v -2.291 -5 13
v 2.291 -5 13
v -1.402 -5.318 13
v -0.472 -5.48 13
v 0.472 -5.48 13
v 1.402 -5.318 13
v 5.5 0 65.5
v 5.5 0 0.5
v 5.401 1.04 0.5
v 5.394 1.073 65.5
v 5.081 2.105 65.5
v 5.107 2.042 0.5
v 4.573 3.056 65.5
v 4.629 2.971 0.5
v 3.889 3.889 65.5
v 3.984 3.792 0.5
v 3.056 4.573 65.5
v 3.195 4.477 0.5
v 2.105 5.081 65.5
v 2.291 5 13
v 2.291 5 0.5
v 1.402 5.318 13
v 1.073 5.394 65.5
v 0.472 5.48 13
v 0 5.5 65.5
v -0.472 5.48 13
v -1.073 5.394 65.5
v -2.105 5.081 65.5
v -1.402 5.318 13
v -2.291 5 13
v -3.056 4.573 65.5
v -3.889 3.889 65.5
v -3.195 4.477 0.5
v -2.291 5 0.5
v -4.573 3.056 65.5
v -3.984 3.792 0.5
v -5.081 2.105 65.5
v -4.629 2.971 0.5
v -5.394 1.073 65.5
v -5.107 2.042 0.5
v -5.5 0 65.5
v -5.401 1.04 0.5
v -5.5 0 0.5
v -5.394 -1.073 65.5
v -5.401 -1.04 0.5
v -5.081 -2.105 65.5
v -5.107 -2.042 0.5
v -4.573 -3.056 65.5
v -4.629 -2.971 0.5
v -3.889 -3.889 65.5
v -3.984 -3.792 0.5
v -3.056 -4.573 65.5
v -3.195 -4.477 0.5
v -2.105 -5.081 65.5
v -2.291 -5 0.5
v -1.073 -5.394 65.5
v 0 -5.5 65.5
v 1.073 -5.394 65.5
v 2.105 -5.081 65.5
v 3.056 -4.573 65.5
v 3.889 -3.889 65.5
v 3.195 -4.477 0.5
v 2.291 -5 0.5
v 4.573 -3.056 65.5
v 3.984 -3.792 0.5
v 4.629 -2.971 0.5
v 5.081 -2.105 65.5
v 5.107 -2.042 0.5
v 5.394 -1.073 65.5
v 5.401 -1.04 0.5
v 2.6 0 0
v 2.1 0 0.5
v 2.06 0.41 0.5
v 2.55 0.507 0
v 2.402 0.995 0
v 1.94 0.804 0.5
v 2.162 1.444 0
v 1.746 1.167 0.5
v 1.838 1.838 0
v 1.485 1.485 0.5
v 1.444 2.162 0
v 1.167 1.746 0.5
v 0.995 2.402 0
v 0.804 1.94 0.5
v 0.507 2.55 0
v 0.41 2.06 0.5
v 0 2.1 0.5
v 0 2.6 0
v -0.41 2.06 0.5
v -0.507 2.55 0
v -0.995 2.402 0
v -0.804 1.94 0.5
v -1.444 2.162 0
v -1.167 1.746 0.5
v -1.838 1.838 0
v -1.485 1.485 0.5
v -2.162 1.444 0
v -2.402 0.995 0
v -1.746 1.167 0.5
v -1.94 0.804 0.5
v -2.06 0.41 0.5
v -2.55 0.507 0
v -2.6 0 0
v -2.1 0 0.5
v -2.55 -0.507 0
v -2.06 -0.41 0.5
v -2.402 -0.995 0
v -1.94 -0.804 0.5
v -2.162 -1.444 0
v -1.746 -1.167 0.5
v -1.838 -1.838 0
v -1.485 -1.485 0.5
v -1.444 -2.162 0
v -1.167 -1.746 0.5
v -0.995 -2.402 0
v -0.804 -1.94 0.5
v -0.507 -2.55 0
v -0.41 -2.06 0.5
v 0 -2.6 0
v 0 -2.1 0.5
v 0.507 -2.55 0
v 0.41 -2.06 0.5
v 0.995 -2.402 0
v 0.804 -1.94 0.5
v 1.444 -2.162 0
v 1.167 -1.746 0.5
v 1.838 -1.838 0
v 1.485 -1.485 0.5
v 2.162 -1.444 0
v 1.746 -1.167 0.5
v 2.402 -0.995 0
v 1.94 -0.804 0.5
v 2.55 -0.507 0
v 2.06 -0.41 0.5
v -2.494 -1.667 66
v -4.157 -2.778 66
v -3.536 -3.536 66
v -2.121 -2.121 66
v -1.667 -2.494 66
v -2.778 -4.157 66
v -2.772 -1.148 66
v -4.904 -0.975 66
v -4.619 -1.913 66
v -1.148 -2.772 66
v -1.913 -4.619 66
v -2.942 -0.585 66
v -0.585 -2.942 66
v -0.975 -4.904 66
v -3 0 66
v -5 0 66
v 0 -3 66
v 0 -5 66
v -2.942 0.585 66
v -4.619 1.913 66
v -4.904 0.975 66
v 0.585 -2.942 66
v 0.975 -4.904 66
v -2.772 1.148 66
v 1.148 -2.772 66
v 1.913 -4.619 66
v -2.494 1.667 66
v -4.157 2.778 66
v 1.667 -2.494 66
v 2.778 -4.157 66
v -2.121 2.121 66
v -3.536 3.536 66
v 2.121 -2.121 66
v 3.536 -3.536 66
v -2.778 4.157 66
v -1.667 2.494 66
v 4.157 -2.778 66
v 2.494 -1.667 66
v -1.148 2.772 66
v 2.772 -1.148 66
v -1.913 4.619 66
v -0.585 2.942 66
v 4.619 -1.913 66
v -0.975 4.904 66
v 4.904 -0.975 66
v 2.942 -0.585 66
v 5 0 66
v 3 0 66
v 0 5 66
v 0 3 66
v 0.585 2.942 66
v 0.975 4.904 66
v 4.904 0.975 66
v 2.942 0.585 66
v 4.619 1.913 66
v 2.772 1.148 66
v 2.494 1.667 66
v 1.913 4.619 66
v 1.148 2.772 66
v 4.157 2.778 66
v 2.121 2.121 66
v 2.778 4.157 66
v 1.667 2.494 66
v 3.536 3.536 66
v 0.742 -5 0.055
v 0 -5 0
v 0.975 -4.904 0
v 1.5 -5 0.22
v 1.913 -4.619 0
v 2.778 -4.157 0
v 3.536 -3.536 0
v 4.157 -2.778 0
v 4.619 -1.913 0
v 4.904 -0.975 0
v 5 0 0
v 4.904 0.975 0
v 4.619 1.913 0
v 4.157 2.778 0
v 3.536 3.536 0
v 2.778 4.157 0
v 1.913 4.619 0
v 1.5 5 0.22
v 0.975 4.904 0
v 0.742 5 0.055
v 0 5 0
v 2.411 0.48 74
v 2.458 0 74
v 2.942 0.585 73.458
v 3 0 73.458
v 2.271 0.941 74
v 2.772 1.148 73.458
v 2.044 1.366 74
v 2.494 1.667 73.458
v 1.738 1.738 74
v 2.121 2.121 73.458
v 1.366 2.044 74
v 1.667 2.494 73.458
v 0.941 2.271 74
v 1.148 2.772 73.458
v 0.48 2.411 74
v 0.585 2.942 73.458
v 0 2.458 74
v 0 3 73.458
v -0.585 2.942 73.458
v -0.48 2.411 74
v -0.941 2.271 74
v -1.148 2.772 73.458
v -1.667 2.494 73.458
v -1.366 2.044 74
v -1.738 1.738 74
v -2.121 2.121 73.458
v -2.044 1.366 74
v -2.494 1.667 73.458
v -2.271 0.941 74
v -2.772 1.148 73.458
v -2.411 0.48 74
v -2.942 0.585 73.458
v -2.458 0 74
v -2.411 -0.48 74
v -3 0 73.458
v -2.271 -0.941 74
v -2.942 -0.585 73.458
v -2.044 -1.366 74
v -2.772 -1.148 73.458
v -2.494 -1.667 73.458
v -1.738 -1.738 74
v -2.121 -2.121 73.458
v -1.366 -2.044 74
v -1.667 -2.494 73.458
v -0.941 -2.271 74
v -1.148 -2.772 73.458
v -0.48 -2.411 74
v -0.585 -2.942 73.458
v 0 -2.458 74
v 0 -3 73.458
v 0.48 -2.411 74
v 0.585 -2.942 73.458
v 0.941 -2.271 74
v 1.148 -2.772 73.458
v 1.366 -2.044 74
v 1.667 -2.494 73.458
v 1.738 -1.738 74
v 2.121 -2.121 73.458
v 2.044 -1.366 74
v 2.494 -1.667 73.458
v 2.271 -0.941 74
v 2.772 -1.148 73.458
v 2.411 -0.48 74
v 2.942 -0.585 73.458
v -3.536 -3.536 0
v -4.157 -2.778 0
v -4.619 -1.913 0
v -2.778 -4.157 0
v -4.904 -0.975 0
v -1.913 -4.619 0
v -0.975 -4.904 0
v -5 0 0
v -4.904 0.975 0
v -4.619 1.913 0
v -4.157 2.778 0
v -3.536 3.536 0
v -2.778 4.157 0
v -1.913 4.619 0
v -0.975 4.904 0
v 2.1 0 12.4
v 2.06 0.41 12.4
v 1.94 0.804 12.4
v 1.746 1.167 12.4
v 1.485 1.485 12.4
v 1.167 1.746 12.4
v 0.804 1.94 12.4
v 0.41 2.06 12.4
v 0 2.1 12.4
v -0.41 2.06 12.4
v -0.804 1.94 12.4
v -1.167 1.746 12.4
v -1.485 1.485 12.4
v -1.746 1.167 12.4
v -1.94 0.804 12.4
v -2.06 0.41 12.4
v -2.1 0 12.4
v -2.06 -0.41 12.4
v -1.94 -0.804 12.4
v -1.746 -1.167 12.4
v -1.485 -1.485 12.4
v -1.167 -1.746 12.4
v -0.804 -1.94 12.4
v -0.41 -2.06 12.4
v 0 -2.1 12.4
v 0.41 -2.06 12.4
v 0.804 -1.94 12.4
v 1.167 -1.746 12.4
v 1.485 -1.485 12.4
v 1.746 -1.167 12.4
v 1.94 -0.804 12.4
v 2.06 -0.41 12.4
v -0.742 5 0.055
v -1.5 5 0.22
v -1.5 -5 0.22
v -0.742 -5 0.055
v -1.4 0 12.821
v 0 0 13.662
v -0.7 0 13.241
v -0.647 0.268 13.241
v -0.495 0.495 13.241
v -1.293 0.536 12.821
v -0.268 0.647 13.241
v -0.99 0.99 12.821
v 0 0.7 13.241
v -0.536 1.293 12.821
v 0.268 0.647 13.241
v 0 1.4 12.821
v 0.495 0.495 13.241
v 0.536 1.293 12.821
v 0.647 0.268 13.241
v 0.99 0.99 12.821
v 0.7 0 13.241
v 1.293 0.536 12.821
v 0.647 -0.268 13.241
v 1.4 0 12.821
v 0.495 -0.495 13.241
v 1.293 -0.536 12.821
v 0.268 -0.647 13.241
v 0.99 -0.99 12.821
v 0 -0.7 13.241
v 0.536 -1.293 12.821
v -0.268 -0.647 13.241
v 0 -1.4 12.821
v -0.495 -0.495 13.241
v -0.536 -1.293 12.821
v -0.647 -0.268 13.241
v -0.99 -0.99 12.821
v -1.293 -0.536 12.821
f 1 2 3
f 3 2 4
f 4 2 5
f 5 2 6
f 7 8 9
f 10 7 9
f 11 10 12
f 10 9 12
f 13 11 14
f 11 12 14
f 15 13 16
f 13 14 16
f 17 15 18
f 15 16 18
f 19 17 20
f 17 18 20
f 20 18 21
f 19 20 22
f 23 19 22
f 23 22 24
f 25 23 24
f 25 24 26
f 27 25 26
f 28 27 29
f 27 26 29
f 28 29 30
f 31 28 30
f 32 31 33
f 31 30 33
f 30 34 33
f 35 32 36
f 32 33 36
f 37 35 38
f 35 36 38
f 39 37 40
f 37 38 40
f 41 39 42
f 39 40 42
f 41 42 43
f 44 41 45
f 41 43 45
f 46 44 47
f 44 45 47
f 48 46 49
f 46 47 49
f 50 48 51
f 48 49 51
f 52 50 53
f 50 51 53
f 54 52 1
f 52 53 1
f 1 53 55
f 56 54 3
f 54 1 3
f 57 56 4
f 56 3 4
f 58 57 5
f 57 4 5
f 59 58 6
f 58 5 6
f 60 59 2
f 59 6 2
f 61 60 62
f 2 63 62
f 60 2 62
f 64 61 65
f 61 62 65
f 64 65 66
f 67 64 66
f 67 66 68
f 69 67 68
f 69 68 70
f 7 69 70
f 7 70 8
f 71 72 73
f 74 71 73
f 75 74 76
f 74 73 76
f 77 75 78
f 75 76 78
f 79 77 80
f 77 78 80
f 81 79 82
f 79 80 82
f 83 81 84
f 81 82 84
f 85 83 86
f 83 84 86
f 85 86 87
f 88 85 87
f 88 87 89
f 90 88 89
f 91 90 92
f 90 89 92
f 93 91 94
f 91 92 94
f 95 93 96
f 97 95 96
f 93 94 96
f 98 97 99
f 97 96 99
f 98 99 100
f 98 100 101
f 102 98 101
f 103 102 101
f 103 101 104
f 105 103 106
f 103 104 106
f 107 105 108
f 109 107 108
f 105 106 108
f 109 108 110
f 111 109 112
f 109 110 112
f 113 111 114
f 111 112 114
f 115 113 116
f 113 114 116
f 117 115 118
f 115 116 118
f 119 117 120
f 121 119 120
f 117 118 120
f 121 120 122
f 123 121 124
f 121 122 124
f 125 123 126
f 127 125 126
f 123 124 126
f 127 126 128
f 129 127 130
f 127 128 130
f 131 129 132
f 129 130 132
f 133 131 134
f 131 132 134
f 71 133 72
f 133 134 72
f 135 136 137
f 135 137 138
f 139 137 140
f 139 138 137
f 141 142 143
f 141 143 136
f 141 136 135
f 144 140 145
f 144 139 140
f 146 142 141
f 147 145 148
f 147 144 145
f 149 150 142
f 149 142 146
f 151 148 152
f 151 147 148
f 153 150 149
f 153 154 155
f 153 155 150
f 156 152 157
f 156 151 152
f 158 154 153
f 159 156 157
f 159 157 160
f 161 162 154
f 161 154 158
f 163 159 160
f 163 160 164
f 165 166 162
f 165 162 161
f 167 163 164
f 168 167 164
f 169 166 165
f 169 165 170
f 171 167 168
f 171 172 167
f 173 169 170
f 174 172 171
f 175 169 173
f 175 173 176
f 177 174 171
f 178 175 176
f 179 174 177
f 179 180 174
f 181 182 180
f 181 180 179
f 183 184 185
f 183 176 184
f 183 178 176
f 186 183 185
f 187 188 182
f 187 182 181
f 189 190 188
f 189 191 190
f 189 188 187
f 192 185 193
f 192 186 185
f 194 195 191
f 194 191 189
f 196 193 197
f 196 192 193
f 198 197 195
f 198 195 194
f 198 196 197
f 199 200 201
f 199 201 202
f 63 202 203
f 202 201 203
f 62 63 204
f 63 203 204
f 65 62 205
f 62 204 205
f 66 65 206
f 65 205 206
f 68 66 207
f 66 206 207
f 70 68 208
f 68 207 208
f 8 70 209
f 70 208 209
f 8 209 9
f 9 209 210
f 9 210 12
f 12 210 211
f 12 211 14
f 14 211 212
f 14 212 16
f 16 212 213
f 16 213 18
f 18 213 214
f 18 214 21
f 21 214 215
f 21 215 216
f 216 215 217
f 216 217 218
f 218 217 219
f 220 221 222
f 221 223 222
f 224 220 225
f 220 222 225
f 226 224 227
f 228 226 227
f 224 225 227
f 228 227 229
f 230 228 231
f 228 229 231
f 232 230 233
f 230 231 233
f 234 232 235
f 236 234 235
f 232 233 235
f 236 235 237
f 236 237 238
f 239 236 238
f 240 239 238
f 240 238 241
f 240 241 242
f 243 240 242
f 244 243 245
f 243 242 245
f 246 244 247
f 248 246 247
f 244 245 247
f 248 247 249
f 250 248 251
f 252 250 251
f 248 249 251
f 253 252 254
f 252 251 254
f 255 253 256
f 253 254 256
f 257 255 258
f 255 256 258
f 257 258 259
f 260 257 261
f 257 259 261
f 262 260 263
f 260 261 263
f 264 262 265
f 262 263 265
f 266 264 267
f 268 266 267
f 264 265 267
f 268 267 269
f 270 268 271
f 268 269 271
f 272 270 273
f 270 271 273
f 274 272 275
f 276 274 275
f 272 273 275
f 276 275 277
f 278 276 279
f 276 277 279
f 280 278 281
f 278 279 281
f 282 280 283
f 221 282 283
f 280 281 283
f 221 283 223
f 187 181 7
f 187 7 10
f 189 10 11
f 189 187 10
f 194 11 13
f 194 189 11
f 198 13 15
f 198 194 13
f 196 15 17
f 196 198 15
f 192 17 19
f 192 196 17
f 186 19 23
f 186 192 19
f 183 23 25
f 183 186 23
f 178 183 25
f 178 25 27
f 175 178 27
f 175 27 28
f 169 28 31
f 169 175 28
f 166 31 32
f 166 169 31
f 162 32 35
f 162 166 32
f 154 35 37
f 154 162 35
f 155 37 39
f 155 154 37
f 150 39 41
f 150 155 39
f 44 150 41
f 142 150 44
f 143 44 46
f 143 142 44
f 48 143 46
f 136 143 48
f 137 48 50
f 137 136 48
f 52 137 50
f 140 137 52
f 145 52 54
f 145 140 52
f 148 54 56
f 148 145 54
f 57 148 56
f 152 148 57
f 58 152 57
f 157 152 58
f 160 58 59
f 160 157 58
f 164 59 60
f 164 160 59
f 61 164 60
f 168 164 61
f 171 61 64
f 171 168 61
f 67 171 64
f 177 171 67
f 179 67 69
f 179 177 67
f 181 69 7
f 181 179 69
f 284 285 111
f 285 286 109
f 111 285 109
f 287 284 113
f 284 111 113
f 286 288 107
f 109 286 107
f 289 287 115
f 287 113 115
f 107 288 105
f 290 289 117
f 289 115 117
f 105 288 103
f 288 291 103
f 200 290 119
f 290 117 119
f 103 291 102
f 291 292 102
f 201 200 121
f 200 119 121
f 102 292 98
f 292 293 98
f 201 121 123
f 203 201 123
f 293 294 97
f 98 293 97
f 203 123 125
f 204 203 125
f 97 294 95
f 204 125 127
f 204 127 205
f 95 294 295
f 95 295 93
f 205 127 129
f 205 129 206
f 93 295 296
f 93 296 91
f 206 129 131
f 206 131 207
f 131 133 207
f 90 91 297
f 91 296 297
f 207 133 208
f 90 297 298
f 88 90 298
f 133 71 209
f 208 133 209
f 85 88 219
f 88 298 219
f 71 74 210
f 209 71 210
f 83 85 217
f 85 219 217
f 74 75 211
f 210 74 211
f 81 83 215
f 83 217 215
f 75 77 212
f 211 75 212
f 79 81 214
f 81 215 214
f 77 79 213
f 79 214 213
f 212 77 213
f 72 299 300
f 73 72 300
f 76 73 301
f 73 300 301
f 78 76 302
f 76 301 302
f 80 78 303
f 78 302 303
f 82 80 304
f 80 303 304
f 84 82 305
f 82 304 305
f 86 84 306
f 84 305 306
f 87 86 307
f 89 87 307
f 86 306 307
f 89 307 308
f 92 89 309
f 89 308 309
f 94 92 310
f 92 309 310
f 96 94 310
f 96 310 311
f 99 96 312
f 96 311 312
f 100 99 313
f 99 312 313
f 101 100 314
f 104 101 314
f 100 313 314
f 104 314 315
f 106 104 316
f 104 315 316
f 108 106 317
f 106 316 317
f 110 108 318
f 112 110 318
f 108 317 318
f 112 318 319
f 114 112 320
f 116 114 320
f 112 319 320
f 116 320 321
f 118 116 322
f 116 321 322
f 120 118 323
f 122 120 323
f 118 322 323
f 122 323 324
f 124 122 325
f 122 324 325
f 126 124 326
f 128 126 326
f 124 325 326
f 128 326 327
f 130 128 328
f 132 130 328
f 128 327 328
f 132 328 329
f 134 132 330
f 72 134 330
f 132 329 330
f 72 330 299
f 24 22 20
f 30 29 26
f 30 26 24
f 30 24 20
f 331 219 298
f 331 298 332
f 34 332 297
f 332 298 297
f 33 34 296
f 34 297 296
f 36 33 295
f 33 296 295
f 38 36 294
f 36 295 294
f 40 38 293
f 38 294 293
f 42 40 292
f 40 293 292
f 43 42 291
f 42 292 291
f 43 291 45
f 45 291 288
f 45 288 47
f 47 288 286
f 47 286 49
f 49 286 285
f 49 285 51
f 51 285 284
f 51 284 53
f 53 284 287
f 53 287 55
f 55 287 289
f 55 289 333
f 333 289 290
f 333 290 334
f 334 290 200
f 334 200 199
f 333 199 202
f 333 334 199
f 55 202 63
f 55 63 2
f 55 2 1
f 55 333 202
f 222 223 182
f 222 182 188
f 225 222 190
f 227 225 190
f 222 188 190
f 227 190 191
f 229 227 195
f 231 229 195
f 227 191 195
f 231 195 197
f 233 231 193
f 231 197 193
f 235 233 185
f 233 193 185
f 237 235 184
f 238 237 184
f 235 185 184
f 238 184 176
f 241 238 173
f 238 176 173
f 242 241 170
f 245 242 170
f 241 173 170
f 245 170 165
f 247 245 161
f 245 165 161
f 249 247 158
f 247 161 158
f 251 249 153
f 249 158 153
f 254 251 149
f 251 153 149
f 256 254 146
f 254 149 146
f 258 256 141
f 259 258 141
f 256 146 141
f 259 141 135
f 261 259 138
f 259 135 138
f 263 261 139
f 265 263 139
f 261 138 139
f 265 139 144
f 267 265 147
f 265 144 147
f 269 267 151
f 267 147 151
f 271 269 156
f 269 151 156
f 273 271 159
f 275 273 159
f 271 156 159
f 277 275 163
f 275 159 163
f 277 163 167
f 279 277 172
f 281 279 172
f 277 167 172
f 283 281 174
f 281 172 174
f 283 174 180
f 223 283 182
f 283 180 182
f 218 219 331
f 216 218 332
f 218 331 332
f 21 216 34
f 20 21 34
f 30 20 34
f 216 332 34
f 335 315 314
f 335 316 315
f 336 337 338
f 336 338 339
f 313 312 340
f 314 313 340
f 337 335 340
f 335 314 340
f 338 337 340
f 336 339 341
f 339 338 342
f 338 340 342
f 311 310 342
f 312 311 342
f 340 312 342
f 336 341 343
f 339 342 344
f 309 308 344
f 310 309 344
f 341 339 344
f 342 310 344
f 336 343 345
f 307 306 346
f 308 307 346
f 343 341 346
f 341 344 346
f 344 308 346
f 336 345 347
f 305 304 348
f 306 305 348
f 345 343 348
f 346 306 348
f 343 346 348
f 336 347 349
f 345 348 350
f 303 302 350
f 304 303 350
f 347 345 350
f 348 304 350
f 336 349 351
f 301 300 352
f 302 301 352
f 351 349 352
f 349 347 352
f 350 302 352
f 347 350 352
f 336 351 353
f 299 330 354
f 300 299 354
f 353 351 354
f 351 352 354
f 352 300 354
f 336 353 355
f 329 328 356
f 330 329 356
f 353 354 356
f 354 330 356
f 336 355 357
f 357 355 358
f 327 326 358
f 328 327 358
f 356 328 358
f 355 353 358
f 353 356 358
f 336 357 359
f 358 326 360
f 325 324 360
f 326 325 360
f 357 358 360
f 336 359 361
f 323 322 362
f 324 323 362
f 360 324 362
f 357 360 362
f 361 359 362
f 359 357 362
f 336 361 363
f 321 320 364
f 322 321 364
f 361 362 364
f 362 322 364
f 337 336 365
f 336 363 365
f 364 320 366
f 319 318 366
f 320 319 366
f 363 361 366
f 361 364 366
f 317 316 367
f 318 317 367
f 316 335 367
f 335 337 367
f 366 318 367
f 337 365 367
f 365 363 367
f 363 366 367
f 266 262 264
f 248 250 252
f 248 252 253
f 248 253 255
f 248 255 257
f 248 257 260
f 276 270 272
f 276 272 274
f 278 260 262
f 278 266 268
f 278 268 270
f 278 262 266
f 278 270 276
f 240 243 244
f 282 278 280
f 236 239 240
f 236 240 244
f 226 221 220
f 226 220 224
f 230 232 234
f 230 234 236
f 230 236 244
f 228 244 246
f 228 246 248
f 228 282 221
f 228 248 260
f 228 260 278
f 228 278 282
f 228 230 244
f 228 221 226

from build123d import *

# Parameters (mm, degrees)
SKETCH_1_R             = 5.5
EXTRUDE_1_DEPTH        = 66
CHAMFER_1_SIZE         = 0.5
SKETCH_2_R             = 3.3
EXTRUDE_2_DEPTH        = 8
HOLE_WIZARD_M5_1_D     = 4.2
HOLE_WIZARD_M5_1_DEPTH = 12.4
HOLE_WIZARD_M5_1_TIP   = 1.2618073
CHAMFER_3_SIZE         = 0.5
SKETCH_6_W             = 10
SKETCH_6_H             = 3
CUT_EXTRUDE_1_DEPTH    = 13


# Read off the part's stored shape, not the designer's step: M6 机械螺纹 螺柱1
with BuildPart() as part:
    # 草图1 → 拉伸1 (new body)
    with BuildSketch(Plane.XY):
        Circle(SKETCH_1_R)
    extrude(amount=EXTRUDE_1_DEPTH)

    # 倒角1
    chamfer_1_edges = [part.edges().sort_by_distance(p)[0] for p in [
        (-5.5, 0, 0),
        (-5.5, 0, 66),
    ]]
    chamfer(chamfer_1_edges, length=CHAMFER_1_SIZE)

    # 草图2 → 拉伸2 (add)
    with BuildSketch(Plane.XY.offset(66)):
        Circle(SKETCH_2_R)
    extrude(amount=EXTRUDE_2_DEPTH)

    # M5 螺纹孔1
    with Locations(Plane(origin=(0, 0, 0), x_dir=(-1, 0, 0), z_dir=(0, 0, -1))):
        with Locations((0, 0)):
            Hole(HOLE_WIZARD_M5_1_D / 2, depth=HOLE_WIZARD_M5_1_DEPTH)
            with Locations((0, 0, -(HOLE_WIZARD_M5_1_DEPTH + HOLE_WIZARD_M5_1_TIP / 2))):  # 118° drill point
                Cone(0, HOLE_WIZARD_M5_1_D / 2, HOLE_WIZARD_M5_1_TIP, mode=Mode.SUBTRACT)

    # 倒角3
    chamfer_3_edges = [part.edges().sort_by_distance(p)[0] for p in [
        (-2.1, 0, 0),
    ]]
    chamfer(chamfer_3_edges, length=CHAMFER_3_SIZE)

    # 草图6 → 切除-拉伸1 (cut)
    with BuildSketch(Plane(origin=(0, 0, 0), x_dir=(-1, 0, 0), z_dir=(0, 0, -1))):
        with Locations((0, 6.5)):
            Rectangle(SKETCH_6_W, SKETCH_6_H)
        with Locations((0, -6.5)):
            Rectangle(SKETCH_6_W, SKETCH_6_H)
    extrude(amount=-CUT_EXTRUDE_1_DEPTH, mode=Mode.SUBTRACT)

    # M6 机械螺纹 螺柱1 outline → M6 机械螺纹 螺柱1 (revolve, cut)
    with BuildSketch(Plane.XZ):
        Polygon((3.3, 74), (2.4585, 74), (3, 73.4585), (3, 66), (3.3, 66), align=None)
    revolve(axis=Axis((0, 0, 0), (0, 0, 1)), mode=Mode.SUBTRACT)


solid = part.part
